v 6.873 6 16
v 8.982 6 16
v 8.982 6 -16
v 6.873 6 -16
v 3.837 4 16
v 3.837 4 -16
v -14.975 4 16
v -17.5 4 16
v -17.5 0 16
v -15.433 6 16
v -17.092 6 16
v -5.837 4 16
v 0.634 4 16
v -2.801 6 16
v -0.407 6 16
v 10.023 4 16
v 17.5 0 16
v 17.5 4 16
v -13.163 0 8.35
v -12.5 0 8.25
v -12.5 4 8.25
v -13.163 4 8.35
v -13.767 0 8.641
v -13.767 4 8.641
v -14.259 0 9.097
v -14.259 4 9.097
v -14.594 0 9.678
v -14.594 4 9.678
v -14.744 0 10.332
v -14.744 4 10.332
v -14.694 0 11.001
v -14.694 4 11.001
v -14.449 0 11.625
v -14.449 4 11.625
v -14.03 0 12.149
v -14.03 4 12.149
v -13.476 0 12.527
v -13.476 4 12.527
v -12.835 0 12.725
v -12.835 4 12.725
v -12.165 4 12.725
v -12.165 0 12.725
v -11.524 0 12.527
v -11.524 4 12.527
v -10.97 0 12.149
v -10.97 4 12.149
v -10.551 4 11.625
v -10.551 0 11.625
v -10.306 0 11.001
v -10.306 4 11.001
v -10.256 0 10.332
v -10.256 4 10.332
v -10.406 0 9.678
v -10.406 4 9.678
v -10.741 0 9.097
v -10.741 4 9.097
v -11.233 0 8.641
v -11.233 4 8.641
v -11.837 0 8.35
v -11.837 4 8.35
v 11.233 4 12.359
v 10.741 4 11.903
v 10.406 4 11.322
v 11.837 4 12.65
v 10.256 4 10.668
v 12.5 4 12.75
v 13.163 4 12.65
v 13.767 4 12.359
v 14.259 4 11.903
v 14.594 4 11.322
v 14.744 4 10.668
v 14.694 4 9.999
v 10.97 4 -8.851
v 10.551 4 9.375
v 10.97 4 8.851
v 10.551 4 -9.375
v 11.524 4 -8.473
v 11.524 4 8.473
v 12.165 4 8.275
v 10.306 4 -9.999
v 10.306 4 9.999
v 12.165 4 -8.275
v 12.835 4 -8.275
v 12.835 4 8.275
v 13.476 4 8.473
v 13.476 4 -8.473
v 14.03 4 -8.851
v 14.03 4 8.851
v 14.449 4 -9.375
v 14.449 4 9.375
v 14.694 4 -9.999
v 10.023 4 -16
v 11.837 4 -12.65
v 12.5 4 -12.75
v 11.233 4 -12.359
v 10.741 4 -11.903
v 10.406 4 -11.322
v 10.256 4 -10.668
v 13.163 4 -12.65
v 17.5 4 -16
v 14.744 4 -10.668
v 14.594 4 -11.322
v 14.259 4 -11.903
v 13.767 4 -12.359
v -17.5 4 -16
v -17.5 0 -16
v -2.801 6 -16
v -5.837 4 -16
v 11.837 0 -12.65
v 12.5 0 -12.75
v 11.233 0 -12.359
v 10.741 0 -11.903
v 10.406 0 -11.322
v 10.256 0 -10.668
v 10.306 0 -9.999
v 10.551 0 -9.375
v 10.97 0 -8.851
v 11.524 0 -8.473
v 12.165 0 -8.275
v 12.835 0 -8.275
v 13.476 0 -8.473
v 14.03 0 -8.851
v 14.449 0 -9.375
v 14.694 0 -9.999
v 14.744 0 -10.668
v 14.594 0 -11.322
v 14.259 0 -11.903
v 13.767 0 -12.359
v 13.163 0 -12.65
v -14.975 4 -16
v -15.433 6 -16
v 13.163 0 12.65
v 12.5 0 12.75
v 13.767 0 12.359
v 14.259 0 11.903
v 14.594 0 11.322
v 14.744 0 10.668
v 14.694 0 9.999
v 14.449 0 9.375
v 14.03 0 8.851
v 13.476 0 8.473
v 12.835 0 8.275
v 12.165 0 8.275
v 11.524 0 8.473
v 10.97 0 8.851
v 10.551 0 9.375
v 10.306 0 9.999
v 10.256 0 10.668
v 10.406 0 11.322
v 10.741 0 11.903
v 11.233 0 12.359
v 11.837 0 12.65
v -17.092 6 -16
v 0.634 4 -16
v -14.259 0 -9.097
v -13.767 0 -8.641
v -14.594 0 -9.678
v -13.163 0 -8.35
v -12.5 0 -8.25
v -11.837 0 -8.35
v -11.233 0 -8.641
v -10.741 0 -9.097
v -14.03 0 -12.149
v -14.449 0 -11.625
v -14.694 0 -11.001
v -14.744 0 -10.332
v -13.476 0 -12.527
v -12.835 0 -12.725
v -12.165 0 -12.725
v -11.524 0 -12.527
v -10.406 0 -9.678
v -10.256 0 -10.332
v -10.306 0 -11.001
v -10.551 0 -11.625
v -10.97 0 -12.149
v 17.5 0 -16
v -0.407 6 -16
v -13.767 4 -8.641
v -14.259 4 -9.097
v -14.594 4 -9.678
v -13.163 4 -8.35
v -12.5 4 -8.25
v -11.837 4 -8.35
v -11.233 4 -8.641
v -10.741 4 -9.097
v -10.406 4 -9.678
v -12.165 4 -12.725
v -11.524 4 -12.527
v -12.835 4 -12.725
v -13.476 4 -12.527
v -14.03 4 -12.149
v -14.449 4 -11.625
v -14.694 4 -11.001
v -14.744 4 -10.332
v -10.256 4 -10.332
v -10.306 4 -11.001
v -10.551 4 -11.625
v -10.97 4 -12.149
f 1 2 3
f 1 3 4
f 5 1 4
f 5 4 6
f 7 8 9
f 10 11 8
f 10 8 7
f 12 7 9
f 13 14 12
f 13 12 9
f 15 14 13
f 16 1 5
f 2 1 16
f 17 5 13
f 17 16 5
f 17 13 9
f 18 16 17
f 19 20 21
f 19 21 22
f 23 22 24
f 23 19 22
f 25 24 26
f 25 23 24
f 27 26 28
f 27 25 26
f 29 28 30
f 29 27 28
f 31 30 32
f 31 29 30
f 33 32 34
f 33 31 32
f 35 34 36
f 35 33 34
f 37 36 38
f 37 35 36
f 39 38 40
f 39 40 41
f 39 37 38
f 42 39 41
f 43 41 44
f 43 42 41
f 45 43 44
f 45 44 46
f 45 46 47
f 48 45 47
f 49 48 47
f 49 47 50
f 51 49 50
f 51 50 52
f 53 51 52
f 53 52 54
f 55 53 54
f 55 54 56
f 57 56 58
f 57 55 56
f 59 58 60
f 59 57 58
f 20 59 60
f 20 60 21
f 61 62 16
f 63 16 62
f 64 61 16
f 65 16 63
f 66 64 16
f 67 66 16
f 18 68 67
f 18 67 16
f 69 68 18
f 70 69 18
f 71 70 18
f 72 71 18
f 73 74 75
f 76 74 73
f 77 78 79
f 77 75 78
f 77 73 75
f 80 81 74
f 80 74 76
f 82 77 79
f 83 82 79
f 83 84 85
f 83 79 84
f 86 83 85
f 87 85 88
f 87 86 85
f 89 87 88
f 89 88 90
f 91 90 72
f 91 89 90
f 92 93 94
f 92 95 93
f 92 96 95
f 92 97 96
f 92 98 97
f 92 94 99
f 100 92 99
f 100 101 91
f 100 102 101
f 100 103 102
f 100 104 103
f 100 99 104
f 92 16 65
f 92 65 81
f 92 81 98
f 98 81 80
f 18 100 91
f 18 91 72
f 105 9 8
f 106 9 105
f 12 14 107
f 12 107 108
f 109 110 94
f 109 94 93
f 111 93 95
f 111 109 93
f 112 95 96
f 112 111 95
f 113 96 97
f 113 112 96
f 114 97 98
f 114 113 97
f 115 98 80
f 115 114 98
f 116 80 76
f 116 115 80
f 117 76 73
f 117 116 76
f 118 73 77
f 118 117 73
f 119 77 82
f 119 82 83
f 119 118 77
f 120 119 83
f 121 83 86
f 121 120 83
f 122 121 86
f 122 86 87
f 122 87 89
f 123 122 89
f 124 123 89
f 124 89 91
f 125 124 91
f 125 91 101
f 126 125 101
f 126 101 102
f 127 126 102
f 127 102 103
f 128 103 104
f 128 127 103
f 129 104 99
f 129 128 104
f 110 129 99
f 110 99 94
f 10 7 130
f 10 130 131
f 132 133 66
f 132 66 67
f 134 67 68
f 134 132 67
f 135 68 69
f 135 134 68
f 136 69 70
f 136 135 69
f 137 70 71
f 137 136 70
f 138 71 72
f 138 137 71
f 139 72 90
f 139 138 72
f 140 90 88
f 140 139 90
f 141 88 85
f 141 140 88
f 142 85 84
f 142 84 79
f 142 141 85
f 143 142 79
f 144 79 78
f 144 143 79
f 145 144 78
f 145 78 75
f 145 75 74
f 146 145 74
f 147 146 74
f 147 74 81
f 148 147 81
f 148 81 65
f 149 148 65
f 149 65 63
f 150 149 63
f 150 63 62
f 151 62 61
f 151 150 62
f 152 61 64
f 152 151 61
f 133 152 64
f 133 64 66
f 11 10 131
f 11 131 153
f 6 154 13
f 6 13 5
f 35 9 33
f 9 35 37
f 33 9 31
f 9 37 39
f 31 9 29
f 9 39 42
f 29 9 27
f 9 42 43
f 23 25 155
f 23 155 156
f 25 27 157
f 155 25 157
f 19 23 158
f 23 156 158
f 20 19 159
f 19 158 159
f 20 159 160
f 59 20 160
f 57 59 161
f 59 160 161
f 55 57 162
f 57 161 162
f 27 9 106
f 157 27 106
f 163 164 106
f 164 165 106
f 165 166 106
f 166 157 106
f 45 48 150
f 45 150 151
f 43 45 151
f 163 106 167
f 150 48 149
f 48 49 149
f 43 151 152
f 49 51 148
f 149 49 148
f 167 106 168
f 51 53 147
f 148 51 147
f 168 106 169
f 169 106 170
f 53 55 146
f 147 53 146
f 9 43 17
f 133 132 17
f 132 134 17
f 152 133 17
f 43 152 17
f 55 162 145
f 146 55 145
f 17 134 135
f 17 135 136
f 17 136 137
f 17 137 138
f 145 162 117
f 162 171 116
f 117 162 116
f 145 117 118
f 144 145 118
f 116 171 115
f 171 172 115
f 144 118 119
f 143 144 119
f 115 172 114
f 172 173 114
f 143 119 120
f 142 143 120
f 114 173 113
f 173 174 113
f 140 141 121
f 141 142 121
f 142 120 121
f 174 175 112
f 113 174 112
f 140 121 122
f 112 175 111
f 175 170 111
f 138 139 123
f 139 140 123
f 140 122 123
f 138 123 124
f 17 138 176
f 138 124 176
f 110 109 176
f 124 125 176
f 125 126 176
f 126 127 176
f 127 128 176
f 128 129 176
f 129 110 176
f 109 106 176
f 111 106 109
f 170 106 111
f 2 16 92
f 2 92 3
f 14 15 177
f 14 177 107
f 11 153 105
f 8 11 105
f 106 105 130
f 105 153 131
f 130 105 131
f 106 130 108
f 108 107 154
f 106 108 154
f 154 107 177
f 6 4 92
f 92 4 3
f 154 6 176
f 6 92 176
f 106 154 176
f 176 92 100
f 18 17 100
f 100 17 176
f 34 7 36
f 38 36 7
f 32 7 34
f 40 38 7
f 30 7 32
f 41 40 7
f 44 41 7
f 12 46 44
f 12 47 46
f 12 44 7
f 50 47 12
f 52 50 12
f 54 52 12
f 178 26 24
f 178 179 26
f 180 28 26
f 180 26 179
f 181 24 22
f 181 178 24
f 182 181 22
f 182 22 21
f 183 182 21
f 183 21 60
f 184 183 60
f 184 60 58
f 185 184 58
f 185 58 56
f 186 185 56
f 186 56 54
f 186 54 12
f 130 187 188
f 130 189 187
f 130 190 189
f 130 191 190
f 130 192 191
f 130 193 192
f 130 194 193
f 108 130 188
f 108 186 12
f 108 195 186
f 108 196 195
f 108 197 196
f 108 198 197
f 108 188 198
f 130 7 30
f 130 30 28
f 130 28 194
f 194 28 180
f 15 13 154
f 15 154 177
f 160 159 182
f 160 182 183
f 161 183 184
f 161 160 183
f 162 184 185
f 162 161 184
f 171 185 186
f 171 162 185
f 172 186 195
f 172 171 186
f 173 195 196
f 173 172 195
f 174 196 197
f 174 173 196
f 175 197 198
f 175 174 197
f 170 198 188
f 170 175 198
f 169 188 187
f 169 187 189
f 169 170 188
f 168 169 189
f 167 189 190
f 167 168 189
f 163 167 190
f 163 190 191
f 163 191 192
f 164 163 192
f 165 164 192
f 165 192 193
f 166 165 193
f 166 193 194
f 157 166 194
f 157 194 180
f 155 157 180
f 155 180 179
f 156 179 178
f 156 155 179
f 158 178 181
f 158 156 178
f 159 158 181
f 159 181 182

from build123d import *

# Parameters (mm, degrees)
SKETCH_1_W      = 35
SKETCH_1_H      = 32
SKETCH_1_R      = 2.25
EXTRUDE_1_DEPTH = 4
EXTRUDE_2_DEPTH = 32


with BuildPart() as part:
    # 草图1 → 凸台-拉伸1 (new body)
    with BuildSketch(Plane(origin=(0, 0, 0), x_dir=(1, 0, 0), z_dir=(0, 1, 0))):
        Rectangle(SKETCH_1_W, SKETCH_1_H)
        with Locations(Location((-12.5, 10.5, 0), (0, 0, 270))):
            Circle(SKETCH_1_R, mode=Mode.SUBTRACT)
        with Locations(Location((-12.5, -10.5, 0), (0, 0, 90))):
            Circle(SKETCH_1_R, mode=Mode.SUBTRACT)
        with Locations(Location((12.5, -10.5, 0), (0, 0, 270))):
            Circle(SKETCH_1_R, mode=Mode.SUBTRACT)
        with Locations(Location((12.5, 10.5, 0), (0, 0, 90))):
            Circle(SKETCH_1_R, mode=Mode.SUBTRACT)
    extrude(amount=EXTRUDE_1_DEPTH)

    # 草图3 → 凸台-拉伸2 (add)
    with BuildSketch(Plane.XY.offset(16)):
        Polygon((6.872858809, 6), (3.83657923, 4), (10.023141572, 4), (8.981867617, 6), align=None)
        Polygon((-2.800937358, 6), (-5.837216937, 4), (0.634129455, 4), (-0.4071445, 6), align=None)
        Polygon((-17.09182921, 6), (-17.5, 4), (-14.975210984, 4), (-15.433336788, 6), align=None)
    extrude(amount=-EXTRUDE_2_DEPTH)


solid = part.part
